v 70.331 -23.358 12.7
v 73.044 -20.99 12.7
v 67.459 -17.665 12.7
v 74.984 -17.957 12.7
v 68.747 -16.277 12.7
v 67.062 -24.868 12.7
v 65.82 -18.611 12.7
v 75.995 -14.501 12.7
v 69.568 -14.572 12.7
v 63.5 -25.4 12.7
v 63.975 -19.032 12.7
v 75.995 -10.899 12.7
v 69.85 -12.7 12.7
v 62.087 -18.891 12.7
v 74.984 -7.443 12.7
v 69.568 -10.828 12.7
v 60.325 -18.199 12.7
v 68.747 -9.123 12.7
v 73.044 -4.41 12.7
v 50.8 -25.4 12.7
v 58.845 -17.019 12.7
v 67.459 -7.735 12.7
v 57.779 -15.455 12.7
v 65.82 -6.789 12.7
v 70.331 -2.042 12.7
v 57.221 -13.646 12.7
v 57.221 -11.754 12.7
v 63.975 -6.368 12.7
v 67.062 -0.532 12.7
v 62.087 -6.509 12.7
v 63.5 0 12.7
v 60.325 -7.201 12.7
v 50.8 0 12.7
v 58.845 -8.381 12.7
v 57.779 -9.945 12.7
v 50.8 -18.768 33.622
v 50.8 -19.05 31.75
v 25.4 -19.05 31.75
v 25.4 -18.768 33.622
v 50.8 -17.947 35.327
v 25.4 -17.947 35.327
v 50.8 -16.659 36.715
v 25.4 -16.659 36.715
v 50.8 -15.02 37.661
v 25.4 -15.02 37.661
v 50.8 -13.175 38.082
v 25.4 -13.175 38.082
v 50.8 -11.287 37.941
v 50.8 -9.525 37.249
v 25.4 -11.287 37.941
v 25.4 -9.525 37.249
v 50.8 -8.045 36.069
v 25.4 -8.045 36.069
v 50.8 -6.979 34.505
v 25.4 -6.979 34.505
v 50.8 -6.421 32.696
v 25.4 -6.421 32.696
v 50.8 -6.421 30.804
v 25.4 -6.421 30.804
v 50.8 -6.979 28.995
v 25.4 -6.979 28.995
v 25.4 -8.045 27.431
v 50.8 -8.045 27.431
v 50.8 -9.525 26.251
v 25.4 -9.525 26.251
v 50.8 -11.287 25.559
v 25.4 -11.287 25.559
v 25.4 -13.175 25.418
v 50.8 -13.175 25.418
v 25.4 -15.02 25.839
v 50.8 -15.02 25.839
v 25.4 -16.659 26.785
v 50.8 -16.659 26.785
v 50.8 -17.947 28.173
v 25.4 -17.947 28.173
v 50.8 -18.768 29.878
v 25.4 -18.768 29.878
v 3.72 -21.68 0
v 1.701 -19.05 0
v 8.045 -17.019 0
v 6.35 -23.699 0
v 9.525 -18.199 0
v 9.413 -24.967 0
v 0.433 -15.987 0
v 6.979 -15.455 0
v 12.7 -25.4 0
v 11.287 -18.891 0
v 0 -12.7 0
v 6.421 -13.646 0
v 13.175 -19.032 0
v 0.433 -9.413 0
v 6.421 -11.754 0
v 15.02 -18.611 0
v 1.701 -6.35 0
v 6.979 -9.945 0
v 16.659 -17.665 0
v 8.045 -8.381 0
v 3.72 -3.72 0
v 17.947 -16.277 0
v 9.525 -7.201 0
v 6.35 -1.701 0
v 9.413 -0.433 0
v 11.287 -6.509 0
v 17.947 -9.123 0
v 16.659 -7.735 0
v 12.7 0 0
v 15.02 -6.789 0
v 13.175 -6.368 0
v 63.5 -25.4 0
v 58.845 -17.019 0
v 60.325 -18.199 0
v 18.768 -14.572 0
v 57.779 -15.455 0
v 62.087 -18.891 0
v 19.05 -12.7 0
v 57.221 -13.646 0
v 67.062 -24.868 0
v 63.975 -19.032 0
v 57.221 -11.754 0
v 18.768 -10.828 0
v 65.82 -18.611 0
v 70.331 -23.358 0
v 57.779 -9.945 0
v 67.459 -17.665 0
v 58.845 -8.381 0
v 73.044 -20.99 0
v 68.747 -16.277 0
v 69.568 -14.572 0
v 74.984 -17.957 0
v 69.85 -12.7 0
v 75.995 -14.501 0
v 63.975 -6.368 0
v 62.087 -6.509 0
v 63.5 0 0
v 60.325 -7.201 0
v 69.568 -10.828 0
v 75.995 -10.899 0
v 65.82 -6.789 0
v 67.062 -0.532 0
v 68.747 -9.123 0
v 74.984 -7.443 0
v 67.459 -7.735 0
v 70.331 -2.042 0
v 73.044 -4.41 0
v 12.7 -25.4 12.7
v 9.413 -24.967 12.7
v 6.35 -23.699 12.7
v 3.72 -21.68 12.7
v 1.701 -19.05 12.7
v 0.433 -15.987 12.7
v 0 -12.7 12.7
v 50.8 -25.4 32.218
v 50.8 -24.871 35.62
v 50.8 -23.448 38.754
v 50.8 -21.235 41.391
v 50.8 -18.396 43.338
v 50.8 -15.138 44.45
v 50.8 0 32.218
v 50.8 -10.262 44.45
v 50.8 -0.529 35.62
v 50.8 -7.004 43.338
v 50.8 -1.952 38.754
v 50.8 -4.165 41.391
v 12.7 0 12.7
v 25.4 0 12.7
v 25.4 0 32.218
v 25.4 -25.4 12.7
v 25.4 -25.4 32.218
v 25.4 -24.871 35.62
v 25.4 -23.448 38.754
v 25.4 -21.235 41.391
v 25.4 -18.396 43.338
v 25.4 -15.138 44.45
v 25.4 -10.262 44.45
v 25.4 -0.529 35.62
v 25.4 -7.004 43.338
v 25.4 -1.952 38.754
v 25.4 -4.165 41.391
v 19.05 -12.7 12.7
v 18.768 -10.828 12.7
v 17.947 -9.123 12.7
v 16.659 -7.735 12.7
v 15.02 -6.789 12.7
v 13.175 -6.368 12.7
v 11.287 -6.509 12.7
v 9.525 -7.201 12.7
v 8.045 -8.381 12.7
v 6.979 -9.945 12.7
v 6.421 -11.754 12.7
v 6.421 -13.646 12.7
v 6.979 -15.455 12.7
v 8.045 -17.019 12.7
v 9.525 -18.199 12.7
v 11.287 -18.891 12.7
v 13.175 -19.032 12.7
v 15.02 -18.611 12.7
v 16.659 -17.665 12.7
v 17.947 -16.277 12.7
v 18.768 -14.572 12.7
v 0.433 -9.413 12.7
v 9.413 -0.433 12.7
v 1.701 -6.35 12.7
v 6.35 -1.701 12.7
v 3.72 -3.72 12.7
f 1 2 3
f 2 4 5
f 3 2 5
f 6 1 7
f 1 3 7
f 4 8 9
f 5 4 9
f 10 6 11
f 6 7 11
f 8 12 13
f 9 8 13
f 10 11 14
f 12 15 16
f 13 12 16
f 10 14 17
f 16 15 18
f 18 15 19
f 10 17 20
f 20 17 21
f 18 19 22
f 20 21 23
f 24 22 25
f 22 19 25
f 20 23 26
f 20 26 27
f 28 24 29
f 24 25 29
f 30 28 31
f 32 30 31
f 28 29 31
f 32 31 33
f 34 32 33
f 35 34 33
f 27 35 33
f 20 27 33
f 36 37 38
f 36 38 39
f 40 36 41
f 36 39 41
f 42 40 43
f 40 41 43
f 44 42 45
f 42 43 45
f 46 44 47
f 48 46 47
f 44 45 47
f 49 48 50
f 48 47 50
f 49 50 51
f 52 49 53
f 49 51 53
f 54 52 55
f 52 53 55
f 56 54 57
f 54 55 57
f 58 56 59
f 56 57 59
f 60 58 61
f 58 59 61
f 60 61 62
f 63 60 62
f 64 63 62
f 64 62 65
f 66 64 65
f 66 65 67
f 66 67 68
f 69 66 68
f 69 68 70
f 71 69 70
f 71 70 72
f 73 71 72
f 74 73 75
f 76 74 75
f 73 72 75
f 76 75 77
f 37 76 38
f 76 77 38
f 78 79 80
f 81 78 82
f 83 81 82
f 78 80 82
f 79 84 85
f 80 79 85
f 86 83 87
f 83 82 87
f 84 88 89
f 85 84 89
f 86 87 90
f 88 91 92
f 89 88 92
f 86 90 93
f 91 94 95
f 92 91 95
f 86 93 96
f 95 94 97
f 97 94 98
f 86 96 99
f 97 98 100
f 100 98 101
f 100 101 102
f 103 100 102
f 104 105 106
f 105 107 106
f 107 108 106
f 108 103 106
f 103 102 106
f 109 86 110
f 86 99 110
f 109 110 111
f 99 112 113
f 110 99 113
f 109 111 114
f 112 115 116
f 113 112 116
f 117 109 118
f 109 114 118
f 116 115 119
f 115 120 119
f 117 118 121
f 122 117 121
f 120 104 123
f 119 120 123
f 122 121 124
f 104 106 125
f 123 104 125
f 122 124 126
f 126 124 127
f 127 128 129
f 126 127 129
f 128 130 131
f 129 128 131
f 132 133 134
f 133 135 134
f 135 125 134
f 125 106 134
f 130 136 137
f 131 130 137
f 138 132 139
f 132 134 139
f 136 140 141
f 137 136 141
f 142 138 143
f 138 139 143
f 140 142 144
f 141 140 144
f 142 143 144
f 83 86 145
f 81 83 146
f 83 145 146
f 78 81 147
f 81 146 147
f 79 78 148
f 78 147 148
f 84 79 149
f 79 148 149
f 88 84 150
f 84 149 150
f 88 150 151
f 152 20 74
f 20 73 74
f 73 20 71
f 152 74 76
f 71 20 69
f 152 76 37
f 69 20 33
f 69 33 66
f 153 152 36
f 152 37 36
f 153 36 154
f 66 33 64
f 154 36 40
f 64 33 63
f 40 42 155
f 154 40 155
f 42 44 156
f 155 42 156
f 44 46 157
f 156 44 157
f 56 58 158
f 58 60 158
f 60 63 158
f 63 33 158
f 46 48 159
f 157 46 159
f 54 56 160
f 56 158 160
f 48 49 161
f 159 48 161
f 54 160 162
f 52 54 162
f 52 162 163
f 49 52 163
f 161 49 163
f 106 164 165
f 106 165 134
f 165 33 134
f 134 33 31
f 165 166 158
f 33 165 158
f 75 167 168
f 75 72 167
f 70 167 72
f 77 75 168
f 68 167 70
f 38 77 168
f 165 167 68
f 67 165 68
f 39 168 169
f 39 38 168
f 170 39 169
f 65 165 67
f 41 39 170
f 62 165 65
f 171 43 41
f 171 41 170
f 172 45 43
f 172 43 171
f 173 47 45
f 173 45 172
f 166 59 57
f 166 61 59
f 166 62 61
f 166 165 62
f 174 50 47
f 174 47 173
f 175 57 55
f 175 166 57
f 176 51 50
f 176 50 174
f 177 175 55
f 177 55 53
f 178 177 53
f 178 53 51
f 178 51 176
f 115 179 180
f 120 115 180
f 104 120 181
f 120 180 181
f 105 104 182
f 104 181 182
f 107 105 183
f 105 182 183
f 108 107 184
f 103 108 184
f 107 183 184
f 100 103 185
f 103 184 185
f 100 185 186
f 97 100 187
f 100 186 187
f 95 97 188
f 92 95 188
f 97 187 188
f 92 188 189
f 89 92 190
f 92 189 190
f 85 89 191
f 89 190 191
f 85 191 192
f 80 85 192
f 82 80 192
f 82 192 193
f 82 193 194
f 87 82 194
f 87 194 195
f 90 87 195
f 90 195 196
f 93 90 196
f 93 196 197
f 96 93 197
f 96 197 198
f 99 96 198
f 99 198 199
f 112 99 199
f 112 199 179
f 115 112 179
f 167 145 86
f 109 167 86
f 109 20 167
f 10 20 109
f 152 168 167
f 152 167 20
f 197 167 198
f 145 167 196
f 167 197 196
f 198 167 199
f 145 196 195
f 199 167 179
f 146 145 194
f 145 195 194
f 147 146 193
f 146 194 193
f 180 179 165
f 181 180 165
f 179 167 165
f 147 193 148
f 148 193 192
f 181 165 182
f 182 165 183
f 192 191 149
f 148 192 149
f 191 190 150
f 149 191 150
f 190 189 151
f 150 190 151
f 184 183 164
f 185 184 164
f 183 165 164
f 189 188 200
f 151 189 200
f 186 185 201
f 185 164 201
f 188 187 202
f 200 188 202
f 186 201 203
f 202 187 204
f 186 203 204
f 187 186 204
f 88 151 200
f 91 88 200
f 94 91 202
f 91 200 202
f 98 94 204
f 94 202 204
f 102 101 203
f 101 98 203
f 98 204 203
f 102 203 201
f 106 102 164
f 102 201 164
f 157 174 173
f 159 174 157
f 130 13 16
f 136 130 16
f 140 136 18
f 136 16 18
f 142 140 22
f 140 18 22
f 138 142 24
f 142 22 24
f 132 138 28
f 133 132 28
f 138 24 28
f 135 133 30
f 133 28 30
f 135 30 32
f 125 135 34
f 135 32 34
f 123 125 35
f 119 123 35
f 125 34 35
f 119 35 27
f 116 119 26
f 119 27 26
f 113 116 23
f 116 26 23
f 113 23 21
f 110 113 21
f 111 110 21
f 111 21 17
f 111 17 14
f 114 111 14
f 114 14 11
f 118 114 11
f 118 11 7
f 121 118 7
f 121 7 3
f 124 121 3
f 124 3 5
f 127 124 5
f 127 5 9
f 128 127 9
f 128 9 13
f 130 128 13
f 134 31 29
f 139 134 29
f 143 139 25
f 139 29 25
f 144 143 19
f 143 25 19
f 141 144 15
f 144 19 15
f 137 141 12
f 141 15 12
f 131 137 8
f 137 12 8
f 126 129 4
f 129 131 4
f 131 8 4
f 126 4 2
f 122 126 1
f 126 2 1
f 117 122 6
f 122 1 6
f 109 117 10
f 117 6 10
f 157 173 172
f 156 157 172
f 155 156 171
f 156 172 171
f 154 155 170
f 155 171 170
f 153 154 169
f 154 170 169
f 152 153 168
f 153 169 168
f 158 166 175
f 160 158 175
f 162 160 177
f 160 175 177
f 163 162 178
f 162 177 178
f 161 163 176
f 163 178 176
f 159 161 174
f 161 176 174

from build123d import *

# Parameters (mm, degrees)
F0_W     = 25.4
F0_H     = 12.7
F0_H_2   = 31.75
F1_DEPTH = 25.4
F2_R     = 6.35
F3_DEPTH = 25.4
F4_R     = 6.35
F5_DEPTH = 25.4
F7_DEPTH = 25.4


with BuildPart() as f1:
    # F0 (on Front) → F1 (new body)
    with BuildSketch(Plane.XZ):
        with Locations((12.7, 6.35)):
            Rectangle(F0_W, F0_H)
        with Locations((38.1, 6.35)):
            Rectangle(F0_W, F0_H)
        with Locations((63.5, 6.35)):
            Rectangle(F0_W, F0_H)
        with Locations((38.1, 28.575)):
            Rectangle(F0_W, F0_H_2)
    extrude(amount=F1_DEPTH)

    # F2 (on face) → F3 (cut)
    with BuildSketch(Plane(origin=(25.4, 0, 0), x_dir=(0, -1, 0), z_dir=(-1, 0, 0))):
        with Locations((12.7, 31.75)):
            Circle(F2_R)
        with BuildLine():
            ThreePointArc((0, 32.2180166472), (2.9688610836, 40.1479347861), (10.2620066819, 44.45))
            Line((10.2620066819, 44.45), (0, 44.45))
            Line((0, 44.45), (0, 32.2180166472))
        make_face()
        with BuildLine():
            ThreePointArc((15.1379933181, 44.45), (22.4311389164, 40.1479347861), (25.4, 32.2180166472))
            Line((25.4, 32.2180166472), (25.4, 44.45))
            Line((25.4, 44.45), (15.1379933181, 44.45))
        make_face()
    extrude(amount=-F3_DEPTH, mode=Mode.SUBTRACT)

    # F4 (on face) → F5 (cut)
    with BuildSketch(Plane.XY.offset(12.7)):
        with Locations((12.7, -12.7)):
            Circle(F4_R)
        with Locations((63.5, -12.7)):
            Circle(F4_R)
        with BuildLine():
            ThreePointArc((0, -12.7), (3.7197438789, -3.7197438789), (12.7, 0))
            Line((12.7, 0), (0, 0))
            Line((0, 0), (0, -12.7))
        make_face()
        with BuildLine():
            ThreePointArc((12.7, -25.4), (3.7197438789, -21.6802561211), (0, -12.7))
            Line((0, -12.7), (0, -25.4))
            Line((0, -25.4), (12.7, -25.4))
        make_face()
    extrude(amount=-F5_DEPTH, mode=Mode.SUBTRACT)

    # F6 (on face) → F7 (cut)
    with BuildSketch(Plane.XY.offset(12.7)):
        with BuildLine():
            ThreePointArc((63.5, 0), (76.1234988118, -12.7), (63.5, -25.4))
            Line((63.5, -25.4), (76.2, -25.4))
            Line((76.2, -25.4), (76.2, 0))
            Line((76.2, 0), (63.5, 0))
        make_face()
    extrude(amount=-F7_DEPTH, mode=Mode.SUBTRACT)


solid = f1.part
